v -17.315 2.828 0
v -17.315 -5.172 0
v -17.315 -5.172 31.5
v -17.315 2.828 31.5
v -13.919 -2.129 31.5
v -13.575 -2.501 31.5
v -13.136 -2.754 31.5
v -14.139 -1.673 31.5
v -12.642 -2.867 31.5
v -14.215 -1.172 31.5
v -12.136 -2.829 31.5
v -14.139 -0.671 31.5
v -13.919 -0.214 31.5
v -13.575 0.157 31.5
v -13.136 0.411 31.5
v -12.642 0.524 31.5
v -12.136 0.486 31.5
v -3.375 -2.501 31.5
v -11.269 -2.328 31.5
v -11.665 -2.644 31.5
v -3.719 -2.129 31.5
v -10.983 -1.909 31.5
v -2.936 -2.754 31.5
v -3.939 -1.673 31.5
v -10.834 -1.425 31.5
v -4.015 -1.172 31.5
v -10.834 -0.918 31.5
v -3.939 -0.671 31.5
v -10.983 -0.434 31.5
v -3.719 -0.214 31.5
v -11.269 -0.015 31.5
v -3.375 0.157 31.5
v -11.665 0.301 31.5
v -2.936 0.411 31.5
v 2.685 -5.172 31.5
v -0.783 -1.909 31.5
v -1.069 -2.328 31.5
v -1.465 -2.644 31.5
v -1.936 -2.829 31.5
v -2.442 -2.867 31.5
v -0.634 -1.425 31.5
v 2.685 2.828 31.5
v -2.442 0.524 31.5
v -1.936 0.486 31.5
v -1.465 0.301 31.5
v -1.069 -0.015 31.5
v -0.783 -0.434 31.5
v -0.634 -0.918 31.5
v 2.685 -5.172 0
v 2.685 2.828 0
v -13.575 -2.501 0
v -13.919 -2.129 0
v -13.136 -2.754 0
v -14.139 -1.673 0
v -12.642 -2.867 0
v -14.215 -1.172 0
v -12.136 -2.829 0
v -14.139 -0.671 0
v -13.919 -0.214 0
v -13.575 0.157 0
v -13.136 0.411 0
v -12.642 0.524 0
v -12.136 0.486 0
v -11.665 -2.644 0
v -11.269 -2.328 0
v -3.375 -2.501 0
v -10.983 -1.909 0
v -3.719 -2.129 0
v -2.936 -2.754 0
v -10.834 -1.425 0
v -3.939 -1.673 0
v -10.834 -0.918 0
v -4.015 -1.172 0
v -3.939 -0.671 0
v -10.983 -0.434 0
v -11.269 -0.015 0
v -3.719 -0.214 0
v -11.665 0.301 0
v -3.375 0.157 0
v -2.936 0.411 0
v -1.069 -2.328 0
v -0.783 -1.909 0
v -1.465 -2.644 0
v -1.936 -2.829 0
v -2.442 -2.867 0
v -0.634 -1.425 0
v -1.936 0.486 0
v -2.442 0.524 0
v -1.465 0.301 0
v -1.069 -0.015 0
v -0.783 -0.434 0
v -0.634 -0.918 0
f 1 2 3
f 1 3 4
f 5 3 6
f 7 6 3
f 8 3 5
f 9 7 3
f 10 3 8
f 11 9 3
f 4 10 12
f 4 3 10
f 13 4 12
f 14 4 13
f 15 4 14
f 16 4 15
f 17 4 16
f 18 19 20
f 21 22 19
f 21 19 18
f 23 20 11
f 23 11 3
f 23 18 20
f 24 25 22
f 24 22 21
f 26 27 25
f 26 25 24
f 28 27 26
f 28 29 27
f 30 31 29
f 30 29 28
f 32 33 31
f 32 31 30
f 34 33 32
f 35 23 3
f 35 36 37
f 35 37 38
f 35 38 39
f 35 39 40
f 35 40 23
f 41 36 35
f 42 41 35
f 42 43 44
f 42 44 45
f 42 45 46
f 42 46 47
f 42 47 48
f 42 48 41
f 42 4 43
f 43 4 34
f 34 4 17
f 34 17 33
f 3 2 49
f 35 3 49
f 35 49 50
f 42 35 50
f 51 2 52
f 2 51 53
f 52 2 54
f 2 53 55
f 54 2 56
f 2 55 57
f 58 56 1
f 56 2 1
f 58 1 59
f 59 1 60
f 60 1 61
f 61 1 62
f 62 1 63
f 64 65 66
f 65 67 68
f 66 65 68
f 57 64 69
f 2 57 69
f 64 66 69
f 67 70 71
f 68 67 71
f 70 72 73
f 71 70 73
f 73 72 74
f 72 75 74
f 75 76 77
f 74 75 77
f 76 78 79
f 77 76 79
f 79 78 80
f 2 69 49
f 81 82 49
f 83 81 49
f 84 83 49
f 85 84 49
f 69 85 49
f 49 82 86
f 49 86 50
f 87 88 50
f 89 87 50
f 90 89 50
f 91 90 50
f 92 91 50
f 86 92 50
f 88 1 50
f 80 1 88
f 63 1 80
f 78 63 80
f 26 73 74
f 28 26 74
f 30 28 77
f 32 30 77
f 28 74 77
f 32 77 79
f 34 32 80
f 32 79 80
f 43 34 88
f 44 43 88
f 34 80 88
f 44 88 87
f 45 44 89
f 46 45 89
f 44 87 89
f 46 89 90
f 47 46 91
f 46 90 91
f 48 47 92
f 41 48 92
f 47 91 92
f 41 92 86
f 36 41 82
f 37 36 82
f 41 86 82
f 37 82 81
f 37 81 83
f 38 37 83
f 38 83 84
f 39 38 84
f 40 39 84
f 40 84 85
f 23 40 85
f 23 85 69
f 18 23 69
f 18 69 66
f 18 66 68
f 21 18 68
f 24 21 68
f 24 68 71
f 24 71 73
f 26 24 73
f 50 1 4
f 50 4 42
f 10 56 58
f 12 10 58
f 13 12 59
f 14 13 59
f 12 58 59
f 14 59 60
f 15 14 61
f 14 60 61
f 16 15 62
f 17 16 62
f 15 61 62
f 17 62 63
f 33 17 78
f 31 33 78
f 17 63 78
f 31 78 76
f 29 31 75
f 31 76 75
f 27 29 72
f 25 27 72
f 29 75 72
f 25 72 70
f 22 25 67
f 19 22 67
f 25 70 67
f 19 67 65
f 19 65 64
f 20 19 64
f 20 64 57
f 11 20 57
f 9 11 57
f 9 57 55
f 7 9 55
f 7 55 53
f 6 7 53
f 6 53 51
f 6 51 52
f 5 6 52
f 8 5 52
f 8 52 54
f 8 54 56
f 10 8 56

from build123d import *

# Parameters (mm, degrees)
ESQUISSE1_W                = 20
ESQUISSE1_H                = 8
BOSS_EXTRU_1_DEPTH         = 31.5
D_GAGEMENT_M31_D           = 3.4
R_P_TITION_LIN_AIRE1_COUNT = 2
R_P_TITION_LIN_AIRE1_PITCH = 10.2


with BuildPart() as part:
    # Esquisse1 → Boss.-Extru.1 (new body)
    with BuildSketch(Plane.XY):
        with Locations((-7.314758755, -1.171717172)):
            Rectangle(ESQUISSE1_W, ESQUISSE1_H)
    extrude(amount=BOSS_EXTRU_1_DEPTH)

    # Dégagement M31 (through all)
    with Locations(Plane.XY.offset(31.5)):
        with Locations((-2.314758755, -1.171717172)):
            d_gagement_m31 = Hole(D_GAGEMENT_M31_D / 2)

    # Répétition linéaire1: Dégagement M31 ×2
    with Locations(*[(-i * R_P_TITION_LIN_AIRE1_PITCH, 0, 0) for i in range(1, R_P_TITION_LIN_AIRE1_COUNT)]):
        add(d_gagement_m31, mode=Mode.SUBTRACT)


solid = part.part
